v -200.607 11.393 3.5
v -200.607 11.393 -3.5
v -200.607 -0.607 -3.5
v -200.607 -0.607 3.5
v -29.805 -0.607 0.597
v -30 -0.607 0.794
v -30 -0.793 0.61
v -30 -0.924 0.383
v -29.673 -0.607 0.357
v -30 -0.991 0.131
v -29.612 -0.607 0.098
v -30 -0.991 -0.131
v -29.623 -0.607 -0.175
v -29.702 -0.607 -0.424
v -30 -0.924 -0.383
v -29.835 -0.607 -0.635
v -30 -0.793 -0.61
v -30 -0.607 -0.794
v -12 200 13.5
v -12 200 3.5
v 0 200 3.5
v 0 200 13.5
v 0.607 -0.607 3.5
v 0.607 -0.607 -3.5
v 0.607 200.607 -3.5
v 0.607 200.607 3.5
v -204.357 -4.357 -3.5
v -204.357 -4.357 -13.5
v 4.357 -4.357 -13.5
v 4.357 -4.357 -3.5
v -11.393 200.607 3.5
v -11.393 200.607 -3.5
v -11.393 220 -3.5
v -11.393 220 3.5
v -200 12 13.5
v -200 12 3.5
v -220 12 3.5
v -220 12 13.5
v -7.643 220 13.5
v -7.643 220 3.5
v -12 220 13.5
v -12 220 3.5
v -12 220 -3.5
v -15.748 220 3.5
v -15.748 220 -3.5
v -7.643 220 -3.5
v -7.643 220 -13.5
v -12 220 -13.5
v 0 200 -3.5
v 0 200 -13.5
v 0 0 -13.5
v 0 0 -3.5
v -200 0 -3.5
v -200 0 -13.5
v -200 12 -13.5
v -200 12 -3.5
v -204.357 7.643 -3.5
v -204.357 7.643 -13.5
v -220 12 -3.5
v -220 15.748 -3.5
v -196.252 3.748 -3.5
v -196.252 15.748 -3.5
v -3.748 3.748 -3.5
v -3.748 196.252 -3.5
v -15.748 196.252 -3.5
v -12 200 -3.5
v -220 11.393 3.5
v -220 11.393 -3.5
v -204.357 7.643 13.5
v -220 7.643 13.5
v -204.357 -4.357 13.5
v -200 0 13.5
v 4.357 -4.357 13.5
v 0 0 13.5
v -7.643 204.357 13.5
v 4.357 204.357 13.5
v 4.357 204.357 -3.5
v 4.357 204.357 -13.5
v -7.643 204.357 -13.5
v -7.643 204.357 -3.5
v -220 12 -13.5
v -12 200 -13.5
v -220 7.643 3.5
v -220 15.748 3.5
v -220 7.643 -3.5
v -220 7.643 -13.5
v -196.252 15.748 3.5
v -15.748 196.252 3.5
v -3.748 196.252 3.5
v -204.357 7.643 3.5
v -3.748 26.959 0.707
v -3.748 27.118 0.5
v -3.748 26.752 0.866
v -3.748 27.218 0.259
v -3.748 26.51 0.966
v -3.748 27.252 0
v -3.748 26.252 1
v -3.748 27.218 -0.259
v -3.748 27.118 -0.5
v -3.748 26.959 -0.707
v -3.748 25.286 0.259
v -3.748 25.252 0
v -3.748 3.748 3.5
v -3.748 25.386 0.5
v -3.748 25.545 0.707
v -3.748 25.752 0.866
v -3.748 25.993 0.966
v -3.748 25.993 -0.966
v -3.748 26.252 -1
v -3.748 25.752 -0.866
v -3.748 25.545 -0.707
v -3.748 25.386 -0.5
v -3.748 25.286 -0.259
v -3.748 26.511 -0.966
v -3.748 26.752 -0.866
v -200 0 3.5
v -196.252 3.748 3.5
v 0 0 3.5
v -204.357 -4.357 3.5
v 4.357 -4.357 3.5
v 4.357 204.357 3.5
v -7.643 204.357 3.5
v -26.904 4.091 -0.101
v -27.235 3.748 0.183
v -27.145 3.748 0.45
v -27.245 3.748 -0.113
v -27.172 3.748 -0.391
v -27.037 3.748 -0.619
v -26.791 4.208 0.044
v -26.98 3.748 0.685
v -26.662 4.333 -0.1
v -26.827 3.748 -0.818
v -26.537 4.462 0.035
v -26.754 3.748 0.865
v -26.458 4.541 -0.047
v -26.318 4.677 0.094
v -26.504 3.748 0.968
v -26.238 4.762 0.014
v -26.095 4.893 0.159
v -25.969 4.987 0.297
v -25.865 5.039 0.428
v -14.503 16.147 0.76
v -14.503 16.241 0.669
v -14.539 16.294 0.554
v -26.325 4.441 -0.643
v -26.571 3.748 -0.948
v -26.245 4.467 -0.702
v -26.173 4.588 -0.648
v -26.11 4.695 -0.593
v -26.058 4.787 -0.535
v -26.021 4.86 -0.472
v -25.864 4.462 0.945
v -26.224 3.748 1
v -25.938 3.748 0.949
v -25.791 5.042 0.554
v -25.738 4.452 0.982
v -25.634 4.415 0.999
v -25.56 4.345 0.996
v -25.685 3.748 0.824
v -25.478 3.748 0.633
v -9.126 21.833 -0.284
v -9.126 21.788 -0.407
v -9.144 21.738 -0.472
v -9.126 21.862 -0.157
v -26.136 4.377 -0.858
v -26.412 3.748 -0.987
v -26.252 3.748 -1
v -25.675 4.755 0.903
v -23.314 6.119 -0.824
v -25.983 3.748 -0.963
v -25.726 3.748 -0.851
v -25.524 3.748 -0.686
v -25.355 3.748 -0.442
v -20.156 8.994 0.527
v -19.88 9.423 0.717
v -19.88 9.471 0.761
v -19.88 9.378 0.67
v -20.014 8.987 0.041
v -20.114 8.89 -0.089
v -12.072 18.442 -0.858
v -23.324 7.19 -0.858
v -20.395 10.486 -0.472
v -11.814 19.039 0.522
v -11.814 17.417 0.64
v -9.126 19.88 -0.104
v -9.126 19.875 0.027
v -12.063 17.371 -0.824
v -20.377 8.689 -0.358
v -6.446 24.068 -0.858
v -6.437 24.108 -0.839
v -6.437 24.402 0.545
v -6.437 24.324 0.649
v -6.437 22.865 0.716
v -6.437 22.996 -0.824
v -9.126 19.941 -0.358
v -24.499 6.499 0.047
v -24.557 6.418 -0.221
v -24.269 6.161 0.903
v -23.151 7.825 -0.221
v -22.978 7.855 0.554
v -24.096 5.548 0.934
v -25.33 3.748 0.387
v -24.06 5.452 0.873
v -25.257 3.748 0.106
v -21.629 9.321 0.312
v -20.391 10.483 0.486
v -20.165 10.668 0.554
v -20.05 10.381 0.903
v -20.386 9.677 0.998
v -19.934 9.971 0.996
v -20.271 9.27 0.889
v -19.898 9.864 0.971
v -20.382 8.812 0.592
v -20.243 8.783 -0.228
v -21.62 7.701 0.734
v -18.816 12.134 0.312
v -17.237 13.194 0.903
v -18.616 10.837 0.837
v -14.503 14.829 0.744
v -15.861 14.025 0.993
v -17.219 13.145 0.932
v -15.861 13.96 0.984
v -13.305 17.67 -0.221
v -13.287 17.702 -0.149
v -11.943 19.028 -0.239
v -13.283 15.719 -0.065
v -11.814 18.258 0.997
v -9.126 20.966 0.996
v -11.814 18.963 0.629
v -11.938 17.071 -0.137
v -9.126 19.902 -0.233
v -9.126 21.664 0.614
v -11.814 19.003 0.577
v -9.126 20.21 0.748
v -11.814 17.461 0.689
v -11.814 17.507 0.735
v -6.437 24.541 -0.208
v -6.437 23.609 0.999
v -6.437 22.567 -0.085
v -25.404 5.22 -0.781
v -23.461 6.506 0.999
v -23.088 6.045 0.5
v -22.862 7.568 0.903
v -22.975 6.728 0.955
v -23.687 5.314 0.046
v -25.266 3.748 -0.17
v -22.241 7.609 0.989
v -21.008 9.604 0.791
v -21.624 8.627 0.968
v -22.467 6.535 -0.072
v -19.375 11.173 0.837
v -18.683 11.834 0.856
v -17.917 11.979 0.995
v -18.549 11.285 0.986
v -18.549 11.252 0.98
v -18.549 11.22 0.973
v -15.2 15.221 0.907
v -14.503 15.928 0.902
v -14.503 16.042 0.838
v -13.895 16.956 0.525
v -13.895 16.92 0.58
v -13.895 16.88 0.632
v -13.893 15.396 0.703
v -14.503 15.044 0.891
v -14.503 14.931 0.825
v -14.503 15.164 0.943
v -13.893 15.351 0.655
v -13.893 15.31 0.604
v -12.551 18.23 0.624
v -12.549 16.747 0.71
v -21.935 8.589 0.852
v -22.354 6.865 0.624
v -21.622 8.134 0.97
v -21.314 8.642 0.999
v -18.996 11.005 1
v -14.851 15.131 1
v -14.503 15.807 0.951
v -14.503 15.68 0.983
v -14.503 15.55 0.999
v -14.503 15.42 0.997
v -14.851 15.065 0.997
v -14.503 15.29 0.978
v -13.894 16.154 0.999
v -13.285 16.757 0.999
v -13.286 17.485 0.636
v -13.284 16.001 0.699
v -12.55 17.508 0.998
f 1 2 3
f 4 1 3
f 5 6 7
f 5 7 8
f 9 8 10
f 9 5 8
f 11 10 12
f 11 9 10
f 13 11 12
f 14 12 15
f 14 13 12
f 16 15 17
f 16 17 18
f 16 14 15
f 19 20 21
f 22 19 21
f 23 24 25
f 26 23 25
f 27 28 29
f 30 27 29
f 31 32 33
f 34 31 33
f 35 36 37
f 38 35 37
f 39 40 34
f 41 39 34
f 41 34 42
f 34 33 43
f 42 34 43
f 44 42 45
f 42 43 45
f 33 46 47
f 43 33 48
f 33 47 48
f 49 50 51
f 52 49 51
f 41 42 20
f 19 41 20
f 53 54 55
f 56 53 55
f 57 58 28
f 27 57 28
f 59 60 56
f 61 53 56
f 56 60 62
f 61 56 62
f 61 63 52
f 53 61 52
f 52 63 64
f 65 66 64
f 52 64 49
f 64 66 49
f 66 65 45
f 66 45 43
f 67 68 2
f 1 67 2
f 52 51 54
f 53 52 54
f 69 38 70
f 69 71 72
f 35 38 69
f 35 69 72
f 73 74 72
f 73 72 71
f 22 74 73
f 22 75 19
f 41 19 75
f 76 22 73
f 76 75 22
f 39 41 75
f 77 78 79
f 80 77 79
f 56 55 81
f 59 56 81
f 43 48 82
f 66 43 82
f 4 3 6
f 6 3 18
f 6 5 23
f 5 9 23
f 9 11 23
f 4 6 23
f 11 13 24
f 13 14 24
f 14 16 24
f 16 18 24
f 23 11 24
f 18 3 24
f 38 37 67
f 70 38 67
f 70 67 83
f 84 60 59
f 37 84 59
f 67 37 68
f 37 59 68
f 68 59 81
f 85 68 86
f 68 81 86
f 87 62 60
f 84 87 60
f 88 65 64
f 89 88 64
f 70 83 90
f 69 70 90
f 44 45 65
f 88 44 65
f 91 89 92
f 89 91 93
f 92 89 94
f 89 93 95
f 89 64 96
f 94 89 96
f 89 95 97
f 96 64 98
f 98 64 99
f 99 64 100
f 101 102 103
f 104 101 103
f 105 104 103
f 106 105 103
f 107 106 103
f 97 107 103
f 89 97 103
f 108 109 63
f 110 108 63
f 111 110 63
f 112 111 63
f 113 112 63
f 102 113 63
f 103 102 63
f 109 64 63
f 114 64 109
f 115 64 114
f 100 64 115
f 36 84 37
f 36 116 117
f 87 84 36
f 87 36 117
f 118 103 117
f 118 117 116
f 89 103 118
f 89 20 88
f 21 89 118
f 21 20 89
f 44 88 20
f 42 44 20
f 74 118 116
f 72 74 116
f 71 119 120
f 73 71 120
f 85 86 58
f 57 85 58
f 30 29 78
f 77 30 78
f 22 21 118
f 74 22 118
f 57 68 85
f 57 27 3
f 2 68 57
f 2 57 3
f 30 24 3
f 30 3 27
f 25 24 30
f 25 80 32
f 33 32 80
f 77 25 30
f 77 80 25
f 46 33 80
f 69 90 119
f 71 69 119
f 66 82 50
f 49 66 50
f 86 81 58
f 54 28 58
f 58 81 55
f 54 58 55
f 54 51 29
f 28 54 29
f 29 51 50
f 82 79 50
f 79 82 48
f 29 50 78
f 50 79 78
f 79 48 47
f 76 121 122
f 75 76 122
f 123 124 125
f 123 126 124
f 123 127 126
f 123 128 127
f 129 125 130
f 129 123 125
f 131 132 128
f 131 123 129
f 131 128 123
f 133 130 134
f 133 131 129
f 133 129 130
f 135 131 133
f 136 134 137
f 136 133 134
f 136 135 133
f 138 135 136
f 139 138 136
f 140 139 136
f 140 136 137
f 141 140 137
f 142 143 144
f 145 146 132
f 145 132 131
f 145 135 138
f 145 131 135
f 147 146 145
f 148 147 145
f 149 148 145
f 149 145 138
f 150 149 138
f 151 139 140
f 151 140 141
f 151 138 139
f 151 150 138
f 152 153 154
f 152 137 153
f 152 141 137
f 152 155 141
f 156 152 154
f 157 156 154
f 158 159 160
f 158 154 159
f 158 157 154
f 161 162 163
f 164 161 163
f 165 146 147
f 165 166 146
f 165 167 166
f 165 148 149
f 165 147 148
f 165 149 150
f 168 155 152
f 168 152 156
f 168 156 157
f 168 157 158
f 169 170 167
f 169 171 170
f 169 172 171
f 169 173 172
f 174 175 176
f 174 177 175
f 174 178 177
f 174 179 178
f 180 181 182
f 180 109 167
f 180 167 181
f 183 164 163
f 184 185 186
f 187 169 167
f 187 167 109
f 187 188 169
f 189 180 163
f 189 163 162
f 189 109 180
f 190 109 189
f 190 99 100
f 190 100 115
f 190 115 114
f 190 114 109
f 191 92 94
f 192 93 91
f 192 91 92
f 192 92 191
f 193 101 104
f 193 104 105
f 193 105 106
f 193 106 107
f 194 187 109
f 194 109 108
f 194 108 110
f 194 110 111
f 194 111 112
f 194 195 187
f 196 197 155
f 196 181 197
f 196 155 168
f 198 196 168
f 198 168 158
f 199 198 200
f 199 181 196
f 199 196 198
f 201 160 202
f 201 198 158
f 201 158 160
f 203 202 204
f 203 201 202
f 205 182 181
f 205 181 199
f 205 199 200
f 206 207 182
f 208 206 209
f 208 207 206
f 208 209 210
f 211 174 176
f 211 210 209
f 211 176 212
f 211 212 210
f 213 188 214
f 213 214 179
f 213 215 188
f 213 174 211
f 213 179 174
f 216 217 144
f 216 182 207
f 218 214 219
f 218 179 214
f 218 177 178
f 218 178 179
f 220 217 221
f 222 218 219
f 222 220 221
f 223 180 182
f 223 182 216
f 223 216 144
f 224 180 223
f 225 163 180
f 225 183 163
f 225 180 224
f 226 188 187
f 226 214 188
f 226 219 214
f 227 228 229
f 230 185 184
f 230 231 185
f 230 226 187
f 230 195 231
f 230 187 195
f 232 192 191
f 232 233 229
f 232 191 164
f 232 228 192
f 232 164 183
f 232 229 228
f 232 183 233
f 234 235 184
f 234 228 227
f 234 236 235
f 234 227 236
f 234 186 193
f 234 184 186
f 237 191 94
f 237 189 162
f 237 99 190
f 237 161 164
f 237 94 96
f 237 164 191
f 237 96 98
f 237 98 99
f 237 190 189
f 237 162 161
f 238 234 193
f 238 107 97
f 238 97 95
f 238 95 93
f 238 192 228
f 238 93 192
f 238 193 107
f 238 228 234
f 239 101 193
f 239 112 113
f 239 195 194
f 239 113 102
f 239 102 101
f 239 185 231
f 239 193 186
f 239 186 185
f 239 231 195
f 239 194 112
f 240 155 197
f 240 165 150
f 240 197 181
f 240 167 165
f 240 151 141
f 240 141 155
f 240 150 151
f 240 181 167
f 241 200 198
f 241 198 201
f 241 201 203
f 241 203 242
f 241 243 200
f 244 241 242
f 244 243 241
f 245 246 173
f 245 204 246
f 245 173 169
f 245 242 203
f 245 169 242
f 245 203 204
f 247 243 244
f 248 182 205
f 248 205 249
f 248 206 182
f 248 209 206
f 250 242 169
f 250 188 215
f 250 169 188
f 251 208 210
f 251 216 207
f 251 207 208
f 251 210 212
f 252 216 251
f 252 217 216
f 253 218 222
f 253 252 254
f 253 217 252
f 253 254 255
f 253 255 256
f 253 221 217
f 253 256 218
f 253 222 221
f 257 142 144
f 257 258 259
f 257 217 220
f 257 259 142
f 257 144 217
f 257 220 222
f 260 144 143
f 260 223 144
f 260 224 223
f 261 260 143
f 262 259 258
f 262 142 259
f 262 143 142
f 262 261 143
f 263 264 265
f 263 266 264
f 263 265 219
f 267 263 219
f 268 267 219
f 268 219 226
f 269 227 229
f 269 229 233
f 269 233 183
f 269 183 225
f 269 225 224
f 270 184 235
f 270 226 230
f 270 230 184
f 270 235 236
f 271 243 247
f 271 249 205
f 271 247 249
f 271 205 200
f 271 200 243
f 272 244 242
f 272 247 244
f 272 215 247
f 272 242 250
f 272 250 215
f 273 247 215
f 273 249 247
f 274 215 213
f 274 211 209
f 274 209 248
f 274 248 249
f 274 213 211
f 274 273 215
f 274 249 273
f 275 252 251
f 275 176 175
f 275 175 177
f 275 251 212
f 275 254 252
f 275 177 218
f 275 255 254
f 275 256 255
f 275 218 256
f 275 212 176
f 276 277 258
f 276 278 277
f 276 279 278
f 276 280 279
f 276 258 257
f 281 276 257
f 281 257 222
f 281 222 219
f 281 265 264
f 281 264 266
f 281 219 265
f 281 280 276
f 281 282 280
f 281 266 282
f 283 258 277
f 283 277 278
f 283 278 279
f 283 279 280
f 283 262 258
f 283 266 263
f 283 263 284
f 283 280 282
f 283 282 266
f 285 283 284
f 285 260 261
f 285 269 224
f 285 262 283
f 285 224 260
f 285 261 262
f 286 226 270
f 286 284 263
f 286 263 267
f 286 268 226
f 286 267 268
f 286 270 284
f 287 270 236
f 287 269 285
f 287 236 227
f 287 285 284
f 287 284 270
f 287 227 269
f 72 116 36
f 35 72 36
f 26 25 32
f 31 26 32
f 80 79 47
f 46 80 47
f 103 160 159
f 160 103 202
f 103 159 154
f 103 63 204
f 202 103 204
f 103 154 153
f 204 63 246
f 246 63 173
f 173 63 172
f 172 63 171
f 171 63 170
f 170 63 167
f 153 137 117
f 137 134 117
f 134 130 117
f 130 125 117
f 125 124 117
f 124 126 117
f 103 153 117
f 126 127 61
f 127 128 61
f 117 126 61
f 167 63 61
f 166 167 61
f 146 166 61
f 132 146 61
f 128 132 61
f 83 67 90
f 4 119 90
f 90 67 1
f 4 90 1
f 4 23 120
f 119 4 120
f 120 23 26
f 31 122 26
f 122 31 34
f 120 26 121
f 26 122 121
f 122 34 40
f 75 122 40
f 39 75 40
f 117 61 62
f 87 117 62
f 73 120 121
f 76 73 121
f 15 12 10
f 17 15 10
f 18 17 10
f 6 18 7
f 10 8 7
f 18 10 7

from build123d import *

# Parameters (mm, degrees)
SWEEP1_START   = -13.5
SWEEP1_DEPTH   = 10
SWEEP1_START_2 = 3.5
SWEEP1_2_DEPTH = 10
SWEEP1_START_3 = -3.5
SWEEP1_3_DEPTH = 7
SKETCH12_R     = 1


# Read off the part's stored shape, not the designer's step: Sweep1
with BuildPart() as part:
    # Sweep1 outline → Sweep1 (new body)
    with BuildSketch(Plane.XY.offset(SWEEP1_START)):
        Polygon((-7.642649587, 204.357350413), (-7.642649587, 220), (-12, 220), (-12, 200), (0, 200), (0, 0), (-200, 0), (-200, 12), (-220, 12), (-220, 7.642649587), (-204.357350413, 7.642649587), (-204.357350413, -4.357350413), (4.357350413, -4.357350413), (4.357350413, 204.357350413), align=None)
    extrude(amount=SWEEP1_DEPTH)



with BuildPart() as body_2:
    # Sweep1 2 outline → Sweep1 2 (new body)
    with BuildSketch(Plane.XY.offset(SWEEP1_START_2)):
        Polygon((-7.642649587, 204.357350413), (-7.642649587, 220), (-12, 220), (-12, 200), (0, 200), (0, 0), (-200, 0), (-200, 12), (-220, 12), (-220, 7.642649587), (-204.357350413, 7.642649587), (-204.357350413, -4.357350413), (4.357350413, -4.357350413), (4.357350413, 204.357350413), align=None)
    extrude(amount=SWEEP1_2_DEPTH)


with BuildPart() as part_1:
    add(part.part)

    add(body_2.part)  # Sweep1 3 merges body 2
    # Sweep1 3 outline → Sweep1 3 (add)
    with BuildSketch(Plane.XY.offset(SWEEP1_START_3)):
        Polygon((-11.392649587, 200.607350413), (-11.392649587, 220), (-15.74831078, 220), (-15.74831078, 196.25168922), (-3.74831078, 196.25168922), (-3.74831078, 3.74831078), (-196.25168922, 3.74831078), (-196.25168922, 15.74831078), (-220, 15.74831078), (-220, 11.392649587), (-200.607350413, 11.392649587), (-200.607350413, -0.607350413), (0.607350413, -0.607350413), (0.607350413, 200.607350413), align=None)
    extrude(amount=SWEEP1_3_DEPTH)

    # Sweep2: sweep along a path in Sketch11
    with BuildLine(Plane.XY) as sweep2_path:
        Line((-30, 0), (0, 30))
    # Sketch12 → Sweep2 (sweep)
    with BuildSketch(Plane(origin=(0, 0, 0), x_dir=(0, 0, -1), z_dir=(1, 0, 0))):
        with Locations((0, 30)):
            Circle(SKETCH12_R)
    sweep(path=sweep2_path.line)


solid = part_1.part
